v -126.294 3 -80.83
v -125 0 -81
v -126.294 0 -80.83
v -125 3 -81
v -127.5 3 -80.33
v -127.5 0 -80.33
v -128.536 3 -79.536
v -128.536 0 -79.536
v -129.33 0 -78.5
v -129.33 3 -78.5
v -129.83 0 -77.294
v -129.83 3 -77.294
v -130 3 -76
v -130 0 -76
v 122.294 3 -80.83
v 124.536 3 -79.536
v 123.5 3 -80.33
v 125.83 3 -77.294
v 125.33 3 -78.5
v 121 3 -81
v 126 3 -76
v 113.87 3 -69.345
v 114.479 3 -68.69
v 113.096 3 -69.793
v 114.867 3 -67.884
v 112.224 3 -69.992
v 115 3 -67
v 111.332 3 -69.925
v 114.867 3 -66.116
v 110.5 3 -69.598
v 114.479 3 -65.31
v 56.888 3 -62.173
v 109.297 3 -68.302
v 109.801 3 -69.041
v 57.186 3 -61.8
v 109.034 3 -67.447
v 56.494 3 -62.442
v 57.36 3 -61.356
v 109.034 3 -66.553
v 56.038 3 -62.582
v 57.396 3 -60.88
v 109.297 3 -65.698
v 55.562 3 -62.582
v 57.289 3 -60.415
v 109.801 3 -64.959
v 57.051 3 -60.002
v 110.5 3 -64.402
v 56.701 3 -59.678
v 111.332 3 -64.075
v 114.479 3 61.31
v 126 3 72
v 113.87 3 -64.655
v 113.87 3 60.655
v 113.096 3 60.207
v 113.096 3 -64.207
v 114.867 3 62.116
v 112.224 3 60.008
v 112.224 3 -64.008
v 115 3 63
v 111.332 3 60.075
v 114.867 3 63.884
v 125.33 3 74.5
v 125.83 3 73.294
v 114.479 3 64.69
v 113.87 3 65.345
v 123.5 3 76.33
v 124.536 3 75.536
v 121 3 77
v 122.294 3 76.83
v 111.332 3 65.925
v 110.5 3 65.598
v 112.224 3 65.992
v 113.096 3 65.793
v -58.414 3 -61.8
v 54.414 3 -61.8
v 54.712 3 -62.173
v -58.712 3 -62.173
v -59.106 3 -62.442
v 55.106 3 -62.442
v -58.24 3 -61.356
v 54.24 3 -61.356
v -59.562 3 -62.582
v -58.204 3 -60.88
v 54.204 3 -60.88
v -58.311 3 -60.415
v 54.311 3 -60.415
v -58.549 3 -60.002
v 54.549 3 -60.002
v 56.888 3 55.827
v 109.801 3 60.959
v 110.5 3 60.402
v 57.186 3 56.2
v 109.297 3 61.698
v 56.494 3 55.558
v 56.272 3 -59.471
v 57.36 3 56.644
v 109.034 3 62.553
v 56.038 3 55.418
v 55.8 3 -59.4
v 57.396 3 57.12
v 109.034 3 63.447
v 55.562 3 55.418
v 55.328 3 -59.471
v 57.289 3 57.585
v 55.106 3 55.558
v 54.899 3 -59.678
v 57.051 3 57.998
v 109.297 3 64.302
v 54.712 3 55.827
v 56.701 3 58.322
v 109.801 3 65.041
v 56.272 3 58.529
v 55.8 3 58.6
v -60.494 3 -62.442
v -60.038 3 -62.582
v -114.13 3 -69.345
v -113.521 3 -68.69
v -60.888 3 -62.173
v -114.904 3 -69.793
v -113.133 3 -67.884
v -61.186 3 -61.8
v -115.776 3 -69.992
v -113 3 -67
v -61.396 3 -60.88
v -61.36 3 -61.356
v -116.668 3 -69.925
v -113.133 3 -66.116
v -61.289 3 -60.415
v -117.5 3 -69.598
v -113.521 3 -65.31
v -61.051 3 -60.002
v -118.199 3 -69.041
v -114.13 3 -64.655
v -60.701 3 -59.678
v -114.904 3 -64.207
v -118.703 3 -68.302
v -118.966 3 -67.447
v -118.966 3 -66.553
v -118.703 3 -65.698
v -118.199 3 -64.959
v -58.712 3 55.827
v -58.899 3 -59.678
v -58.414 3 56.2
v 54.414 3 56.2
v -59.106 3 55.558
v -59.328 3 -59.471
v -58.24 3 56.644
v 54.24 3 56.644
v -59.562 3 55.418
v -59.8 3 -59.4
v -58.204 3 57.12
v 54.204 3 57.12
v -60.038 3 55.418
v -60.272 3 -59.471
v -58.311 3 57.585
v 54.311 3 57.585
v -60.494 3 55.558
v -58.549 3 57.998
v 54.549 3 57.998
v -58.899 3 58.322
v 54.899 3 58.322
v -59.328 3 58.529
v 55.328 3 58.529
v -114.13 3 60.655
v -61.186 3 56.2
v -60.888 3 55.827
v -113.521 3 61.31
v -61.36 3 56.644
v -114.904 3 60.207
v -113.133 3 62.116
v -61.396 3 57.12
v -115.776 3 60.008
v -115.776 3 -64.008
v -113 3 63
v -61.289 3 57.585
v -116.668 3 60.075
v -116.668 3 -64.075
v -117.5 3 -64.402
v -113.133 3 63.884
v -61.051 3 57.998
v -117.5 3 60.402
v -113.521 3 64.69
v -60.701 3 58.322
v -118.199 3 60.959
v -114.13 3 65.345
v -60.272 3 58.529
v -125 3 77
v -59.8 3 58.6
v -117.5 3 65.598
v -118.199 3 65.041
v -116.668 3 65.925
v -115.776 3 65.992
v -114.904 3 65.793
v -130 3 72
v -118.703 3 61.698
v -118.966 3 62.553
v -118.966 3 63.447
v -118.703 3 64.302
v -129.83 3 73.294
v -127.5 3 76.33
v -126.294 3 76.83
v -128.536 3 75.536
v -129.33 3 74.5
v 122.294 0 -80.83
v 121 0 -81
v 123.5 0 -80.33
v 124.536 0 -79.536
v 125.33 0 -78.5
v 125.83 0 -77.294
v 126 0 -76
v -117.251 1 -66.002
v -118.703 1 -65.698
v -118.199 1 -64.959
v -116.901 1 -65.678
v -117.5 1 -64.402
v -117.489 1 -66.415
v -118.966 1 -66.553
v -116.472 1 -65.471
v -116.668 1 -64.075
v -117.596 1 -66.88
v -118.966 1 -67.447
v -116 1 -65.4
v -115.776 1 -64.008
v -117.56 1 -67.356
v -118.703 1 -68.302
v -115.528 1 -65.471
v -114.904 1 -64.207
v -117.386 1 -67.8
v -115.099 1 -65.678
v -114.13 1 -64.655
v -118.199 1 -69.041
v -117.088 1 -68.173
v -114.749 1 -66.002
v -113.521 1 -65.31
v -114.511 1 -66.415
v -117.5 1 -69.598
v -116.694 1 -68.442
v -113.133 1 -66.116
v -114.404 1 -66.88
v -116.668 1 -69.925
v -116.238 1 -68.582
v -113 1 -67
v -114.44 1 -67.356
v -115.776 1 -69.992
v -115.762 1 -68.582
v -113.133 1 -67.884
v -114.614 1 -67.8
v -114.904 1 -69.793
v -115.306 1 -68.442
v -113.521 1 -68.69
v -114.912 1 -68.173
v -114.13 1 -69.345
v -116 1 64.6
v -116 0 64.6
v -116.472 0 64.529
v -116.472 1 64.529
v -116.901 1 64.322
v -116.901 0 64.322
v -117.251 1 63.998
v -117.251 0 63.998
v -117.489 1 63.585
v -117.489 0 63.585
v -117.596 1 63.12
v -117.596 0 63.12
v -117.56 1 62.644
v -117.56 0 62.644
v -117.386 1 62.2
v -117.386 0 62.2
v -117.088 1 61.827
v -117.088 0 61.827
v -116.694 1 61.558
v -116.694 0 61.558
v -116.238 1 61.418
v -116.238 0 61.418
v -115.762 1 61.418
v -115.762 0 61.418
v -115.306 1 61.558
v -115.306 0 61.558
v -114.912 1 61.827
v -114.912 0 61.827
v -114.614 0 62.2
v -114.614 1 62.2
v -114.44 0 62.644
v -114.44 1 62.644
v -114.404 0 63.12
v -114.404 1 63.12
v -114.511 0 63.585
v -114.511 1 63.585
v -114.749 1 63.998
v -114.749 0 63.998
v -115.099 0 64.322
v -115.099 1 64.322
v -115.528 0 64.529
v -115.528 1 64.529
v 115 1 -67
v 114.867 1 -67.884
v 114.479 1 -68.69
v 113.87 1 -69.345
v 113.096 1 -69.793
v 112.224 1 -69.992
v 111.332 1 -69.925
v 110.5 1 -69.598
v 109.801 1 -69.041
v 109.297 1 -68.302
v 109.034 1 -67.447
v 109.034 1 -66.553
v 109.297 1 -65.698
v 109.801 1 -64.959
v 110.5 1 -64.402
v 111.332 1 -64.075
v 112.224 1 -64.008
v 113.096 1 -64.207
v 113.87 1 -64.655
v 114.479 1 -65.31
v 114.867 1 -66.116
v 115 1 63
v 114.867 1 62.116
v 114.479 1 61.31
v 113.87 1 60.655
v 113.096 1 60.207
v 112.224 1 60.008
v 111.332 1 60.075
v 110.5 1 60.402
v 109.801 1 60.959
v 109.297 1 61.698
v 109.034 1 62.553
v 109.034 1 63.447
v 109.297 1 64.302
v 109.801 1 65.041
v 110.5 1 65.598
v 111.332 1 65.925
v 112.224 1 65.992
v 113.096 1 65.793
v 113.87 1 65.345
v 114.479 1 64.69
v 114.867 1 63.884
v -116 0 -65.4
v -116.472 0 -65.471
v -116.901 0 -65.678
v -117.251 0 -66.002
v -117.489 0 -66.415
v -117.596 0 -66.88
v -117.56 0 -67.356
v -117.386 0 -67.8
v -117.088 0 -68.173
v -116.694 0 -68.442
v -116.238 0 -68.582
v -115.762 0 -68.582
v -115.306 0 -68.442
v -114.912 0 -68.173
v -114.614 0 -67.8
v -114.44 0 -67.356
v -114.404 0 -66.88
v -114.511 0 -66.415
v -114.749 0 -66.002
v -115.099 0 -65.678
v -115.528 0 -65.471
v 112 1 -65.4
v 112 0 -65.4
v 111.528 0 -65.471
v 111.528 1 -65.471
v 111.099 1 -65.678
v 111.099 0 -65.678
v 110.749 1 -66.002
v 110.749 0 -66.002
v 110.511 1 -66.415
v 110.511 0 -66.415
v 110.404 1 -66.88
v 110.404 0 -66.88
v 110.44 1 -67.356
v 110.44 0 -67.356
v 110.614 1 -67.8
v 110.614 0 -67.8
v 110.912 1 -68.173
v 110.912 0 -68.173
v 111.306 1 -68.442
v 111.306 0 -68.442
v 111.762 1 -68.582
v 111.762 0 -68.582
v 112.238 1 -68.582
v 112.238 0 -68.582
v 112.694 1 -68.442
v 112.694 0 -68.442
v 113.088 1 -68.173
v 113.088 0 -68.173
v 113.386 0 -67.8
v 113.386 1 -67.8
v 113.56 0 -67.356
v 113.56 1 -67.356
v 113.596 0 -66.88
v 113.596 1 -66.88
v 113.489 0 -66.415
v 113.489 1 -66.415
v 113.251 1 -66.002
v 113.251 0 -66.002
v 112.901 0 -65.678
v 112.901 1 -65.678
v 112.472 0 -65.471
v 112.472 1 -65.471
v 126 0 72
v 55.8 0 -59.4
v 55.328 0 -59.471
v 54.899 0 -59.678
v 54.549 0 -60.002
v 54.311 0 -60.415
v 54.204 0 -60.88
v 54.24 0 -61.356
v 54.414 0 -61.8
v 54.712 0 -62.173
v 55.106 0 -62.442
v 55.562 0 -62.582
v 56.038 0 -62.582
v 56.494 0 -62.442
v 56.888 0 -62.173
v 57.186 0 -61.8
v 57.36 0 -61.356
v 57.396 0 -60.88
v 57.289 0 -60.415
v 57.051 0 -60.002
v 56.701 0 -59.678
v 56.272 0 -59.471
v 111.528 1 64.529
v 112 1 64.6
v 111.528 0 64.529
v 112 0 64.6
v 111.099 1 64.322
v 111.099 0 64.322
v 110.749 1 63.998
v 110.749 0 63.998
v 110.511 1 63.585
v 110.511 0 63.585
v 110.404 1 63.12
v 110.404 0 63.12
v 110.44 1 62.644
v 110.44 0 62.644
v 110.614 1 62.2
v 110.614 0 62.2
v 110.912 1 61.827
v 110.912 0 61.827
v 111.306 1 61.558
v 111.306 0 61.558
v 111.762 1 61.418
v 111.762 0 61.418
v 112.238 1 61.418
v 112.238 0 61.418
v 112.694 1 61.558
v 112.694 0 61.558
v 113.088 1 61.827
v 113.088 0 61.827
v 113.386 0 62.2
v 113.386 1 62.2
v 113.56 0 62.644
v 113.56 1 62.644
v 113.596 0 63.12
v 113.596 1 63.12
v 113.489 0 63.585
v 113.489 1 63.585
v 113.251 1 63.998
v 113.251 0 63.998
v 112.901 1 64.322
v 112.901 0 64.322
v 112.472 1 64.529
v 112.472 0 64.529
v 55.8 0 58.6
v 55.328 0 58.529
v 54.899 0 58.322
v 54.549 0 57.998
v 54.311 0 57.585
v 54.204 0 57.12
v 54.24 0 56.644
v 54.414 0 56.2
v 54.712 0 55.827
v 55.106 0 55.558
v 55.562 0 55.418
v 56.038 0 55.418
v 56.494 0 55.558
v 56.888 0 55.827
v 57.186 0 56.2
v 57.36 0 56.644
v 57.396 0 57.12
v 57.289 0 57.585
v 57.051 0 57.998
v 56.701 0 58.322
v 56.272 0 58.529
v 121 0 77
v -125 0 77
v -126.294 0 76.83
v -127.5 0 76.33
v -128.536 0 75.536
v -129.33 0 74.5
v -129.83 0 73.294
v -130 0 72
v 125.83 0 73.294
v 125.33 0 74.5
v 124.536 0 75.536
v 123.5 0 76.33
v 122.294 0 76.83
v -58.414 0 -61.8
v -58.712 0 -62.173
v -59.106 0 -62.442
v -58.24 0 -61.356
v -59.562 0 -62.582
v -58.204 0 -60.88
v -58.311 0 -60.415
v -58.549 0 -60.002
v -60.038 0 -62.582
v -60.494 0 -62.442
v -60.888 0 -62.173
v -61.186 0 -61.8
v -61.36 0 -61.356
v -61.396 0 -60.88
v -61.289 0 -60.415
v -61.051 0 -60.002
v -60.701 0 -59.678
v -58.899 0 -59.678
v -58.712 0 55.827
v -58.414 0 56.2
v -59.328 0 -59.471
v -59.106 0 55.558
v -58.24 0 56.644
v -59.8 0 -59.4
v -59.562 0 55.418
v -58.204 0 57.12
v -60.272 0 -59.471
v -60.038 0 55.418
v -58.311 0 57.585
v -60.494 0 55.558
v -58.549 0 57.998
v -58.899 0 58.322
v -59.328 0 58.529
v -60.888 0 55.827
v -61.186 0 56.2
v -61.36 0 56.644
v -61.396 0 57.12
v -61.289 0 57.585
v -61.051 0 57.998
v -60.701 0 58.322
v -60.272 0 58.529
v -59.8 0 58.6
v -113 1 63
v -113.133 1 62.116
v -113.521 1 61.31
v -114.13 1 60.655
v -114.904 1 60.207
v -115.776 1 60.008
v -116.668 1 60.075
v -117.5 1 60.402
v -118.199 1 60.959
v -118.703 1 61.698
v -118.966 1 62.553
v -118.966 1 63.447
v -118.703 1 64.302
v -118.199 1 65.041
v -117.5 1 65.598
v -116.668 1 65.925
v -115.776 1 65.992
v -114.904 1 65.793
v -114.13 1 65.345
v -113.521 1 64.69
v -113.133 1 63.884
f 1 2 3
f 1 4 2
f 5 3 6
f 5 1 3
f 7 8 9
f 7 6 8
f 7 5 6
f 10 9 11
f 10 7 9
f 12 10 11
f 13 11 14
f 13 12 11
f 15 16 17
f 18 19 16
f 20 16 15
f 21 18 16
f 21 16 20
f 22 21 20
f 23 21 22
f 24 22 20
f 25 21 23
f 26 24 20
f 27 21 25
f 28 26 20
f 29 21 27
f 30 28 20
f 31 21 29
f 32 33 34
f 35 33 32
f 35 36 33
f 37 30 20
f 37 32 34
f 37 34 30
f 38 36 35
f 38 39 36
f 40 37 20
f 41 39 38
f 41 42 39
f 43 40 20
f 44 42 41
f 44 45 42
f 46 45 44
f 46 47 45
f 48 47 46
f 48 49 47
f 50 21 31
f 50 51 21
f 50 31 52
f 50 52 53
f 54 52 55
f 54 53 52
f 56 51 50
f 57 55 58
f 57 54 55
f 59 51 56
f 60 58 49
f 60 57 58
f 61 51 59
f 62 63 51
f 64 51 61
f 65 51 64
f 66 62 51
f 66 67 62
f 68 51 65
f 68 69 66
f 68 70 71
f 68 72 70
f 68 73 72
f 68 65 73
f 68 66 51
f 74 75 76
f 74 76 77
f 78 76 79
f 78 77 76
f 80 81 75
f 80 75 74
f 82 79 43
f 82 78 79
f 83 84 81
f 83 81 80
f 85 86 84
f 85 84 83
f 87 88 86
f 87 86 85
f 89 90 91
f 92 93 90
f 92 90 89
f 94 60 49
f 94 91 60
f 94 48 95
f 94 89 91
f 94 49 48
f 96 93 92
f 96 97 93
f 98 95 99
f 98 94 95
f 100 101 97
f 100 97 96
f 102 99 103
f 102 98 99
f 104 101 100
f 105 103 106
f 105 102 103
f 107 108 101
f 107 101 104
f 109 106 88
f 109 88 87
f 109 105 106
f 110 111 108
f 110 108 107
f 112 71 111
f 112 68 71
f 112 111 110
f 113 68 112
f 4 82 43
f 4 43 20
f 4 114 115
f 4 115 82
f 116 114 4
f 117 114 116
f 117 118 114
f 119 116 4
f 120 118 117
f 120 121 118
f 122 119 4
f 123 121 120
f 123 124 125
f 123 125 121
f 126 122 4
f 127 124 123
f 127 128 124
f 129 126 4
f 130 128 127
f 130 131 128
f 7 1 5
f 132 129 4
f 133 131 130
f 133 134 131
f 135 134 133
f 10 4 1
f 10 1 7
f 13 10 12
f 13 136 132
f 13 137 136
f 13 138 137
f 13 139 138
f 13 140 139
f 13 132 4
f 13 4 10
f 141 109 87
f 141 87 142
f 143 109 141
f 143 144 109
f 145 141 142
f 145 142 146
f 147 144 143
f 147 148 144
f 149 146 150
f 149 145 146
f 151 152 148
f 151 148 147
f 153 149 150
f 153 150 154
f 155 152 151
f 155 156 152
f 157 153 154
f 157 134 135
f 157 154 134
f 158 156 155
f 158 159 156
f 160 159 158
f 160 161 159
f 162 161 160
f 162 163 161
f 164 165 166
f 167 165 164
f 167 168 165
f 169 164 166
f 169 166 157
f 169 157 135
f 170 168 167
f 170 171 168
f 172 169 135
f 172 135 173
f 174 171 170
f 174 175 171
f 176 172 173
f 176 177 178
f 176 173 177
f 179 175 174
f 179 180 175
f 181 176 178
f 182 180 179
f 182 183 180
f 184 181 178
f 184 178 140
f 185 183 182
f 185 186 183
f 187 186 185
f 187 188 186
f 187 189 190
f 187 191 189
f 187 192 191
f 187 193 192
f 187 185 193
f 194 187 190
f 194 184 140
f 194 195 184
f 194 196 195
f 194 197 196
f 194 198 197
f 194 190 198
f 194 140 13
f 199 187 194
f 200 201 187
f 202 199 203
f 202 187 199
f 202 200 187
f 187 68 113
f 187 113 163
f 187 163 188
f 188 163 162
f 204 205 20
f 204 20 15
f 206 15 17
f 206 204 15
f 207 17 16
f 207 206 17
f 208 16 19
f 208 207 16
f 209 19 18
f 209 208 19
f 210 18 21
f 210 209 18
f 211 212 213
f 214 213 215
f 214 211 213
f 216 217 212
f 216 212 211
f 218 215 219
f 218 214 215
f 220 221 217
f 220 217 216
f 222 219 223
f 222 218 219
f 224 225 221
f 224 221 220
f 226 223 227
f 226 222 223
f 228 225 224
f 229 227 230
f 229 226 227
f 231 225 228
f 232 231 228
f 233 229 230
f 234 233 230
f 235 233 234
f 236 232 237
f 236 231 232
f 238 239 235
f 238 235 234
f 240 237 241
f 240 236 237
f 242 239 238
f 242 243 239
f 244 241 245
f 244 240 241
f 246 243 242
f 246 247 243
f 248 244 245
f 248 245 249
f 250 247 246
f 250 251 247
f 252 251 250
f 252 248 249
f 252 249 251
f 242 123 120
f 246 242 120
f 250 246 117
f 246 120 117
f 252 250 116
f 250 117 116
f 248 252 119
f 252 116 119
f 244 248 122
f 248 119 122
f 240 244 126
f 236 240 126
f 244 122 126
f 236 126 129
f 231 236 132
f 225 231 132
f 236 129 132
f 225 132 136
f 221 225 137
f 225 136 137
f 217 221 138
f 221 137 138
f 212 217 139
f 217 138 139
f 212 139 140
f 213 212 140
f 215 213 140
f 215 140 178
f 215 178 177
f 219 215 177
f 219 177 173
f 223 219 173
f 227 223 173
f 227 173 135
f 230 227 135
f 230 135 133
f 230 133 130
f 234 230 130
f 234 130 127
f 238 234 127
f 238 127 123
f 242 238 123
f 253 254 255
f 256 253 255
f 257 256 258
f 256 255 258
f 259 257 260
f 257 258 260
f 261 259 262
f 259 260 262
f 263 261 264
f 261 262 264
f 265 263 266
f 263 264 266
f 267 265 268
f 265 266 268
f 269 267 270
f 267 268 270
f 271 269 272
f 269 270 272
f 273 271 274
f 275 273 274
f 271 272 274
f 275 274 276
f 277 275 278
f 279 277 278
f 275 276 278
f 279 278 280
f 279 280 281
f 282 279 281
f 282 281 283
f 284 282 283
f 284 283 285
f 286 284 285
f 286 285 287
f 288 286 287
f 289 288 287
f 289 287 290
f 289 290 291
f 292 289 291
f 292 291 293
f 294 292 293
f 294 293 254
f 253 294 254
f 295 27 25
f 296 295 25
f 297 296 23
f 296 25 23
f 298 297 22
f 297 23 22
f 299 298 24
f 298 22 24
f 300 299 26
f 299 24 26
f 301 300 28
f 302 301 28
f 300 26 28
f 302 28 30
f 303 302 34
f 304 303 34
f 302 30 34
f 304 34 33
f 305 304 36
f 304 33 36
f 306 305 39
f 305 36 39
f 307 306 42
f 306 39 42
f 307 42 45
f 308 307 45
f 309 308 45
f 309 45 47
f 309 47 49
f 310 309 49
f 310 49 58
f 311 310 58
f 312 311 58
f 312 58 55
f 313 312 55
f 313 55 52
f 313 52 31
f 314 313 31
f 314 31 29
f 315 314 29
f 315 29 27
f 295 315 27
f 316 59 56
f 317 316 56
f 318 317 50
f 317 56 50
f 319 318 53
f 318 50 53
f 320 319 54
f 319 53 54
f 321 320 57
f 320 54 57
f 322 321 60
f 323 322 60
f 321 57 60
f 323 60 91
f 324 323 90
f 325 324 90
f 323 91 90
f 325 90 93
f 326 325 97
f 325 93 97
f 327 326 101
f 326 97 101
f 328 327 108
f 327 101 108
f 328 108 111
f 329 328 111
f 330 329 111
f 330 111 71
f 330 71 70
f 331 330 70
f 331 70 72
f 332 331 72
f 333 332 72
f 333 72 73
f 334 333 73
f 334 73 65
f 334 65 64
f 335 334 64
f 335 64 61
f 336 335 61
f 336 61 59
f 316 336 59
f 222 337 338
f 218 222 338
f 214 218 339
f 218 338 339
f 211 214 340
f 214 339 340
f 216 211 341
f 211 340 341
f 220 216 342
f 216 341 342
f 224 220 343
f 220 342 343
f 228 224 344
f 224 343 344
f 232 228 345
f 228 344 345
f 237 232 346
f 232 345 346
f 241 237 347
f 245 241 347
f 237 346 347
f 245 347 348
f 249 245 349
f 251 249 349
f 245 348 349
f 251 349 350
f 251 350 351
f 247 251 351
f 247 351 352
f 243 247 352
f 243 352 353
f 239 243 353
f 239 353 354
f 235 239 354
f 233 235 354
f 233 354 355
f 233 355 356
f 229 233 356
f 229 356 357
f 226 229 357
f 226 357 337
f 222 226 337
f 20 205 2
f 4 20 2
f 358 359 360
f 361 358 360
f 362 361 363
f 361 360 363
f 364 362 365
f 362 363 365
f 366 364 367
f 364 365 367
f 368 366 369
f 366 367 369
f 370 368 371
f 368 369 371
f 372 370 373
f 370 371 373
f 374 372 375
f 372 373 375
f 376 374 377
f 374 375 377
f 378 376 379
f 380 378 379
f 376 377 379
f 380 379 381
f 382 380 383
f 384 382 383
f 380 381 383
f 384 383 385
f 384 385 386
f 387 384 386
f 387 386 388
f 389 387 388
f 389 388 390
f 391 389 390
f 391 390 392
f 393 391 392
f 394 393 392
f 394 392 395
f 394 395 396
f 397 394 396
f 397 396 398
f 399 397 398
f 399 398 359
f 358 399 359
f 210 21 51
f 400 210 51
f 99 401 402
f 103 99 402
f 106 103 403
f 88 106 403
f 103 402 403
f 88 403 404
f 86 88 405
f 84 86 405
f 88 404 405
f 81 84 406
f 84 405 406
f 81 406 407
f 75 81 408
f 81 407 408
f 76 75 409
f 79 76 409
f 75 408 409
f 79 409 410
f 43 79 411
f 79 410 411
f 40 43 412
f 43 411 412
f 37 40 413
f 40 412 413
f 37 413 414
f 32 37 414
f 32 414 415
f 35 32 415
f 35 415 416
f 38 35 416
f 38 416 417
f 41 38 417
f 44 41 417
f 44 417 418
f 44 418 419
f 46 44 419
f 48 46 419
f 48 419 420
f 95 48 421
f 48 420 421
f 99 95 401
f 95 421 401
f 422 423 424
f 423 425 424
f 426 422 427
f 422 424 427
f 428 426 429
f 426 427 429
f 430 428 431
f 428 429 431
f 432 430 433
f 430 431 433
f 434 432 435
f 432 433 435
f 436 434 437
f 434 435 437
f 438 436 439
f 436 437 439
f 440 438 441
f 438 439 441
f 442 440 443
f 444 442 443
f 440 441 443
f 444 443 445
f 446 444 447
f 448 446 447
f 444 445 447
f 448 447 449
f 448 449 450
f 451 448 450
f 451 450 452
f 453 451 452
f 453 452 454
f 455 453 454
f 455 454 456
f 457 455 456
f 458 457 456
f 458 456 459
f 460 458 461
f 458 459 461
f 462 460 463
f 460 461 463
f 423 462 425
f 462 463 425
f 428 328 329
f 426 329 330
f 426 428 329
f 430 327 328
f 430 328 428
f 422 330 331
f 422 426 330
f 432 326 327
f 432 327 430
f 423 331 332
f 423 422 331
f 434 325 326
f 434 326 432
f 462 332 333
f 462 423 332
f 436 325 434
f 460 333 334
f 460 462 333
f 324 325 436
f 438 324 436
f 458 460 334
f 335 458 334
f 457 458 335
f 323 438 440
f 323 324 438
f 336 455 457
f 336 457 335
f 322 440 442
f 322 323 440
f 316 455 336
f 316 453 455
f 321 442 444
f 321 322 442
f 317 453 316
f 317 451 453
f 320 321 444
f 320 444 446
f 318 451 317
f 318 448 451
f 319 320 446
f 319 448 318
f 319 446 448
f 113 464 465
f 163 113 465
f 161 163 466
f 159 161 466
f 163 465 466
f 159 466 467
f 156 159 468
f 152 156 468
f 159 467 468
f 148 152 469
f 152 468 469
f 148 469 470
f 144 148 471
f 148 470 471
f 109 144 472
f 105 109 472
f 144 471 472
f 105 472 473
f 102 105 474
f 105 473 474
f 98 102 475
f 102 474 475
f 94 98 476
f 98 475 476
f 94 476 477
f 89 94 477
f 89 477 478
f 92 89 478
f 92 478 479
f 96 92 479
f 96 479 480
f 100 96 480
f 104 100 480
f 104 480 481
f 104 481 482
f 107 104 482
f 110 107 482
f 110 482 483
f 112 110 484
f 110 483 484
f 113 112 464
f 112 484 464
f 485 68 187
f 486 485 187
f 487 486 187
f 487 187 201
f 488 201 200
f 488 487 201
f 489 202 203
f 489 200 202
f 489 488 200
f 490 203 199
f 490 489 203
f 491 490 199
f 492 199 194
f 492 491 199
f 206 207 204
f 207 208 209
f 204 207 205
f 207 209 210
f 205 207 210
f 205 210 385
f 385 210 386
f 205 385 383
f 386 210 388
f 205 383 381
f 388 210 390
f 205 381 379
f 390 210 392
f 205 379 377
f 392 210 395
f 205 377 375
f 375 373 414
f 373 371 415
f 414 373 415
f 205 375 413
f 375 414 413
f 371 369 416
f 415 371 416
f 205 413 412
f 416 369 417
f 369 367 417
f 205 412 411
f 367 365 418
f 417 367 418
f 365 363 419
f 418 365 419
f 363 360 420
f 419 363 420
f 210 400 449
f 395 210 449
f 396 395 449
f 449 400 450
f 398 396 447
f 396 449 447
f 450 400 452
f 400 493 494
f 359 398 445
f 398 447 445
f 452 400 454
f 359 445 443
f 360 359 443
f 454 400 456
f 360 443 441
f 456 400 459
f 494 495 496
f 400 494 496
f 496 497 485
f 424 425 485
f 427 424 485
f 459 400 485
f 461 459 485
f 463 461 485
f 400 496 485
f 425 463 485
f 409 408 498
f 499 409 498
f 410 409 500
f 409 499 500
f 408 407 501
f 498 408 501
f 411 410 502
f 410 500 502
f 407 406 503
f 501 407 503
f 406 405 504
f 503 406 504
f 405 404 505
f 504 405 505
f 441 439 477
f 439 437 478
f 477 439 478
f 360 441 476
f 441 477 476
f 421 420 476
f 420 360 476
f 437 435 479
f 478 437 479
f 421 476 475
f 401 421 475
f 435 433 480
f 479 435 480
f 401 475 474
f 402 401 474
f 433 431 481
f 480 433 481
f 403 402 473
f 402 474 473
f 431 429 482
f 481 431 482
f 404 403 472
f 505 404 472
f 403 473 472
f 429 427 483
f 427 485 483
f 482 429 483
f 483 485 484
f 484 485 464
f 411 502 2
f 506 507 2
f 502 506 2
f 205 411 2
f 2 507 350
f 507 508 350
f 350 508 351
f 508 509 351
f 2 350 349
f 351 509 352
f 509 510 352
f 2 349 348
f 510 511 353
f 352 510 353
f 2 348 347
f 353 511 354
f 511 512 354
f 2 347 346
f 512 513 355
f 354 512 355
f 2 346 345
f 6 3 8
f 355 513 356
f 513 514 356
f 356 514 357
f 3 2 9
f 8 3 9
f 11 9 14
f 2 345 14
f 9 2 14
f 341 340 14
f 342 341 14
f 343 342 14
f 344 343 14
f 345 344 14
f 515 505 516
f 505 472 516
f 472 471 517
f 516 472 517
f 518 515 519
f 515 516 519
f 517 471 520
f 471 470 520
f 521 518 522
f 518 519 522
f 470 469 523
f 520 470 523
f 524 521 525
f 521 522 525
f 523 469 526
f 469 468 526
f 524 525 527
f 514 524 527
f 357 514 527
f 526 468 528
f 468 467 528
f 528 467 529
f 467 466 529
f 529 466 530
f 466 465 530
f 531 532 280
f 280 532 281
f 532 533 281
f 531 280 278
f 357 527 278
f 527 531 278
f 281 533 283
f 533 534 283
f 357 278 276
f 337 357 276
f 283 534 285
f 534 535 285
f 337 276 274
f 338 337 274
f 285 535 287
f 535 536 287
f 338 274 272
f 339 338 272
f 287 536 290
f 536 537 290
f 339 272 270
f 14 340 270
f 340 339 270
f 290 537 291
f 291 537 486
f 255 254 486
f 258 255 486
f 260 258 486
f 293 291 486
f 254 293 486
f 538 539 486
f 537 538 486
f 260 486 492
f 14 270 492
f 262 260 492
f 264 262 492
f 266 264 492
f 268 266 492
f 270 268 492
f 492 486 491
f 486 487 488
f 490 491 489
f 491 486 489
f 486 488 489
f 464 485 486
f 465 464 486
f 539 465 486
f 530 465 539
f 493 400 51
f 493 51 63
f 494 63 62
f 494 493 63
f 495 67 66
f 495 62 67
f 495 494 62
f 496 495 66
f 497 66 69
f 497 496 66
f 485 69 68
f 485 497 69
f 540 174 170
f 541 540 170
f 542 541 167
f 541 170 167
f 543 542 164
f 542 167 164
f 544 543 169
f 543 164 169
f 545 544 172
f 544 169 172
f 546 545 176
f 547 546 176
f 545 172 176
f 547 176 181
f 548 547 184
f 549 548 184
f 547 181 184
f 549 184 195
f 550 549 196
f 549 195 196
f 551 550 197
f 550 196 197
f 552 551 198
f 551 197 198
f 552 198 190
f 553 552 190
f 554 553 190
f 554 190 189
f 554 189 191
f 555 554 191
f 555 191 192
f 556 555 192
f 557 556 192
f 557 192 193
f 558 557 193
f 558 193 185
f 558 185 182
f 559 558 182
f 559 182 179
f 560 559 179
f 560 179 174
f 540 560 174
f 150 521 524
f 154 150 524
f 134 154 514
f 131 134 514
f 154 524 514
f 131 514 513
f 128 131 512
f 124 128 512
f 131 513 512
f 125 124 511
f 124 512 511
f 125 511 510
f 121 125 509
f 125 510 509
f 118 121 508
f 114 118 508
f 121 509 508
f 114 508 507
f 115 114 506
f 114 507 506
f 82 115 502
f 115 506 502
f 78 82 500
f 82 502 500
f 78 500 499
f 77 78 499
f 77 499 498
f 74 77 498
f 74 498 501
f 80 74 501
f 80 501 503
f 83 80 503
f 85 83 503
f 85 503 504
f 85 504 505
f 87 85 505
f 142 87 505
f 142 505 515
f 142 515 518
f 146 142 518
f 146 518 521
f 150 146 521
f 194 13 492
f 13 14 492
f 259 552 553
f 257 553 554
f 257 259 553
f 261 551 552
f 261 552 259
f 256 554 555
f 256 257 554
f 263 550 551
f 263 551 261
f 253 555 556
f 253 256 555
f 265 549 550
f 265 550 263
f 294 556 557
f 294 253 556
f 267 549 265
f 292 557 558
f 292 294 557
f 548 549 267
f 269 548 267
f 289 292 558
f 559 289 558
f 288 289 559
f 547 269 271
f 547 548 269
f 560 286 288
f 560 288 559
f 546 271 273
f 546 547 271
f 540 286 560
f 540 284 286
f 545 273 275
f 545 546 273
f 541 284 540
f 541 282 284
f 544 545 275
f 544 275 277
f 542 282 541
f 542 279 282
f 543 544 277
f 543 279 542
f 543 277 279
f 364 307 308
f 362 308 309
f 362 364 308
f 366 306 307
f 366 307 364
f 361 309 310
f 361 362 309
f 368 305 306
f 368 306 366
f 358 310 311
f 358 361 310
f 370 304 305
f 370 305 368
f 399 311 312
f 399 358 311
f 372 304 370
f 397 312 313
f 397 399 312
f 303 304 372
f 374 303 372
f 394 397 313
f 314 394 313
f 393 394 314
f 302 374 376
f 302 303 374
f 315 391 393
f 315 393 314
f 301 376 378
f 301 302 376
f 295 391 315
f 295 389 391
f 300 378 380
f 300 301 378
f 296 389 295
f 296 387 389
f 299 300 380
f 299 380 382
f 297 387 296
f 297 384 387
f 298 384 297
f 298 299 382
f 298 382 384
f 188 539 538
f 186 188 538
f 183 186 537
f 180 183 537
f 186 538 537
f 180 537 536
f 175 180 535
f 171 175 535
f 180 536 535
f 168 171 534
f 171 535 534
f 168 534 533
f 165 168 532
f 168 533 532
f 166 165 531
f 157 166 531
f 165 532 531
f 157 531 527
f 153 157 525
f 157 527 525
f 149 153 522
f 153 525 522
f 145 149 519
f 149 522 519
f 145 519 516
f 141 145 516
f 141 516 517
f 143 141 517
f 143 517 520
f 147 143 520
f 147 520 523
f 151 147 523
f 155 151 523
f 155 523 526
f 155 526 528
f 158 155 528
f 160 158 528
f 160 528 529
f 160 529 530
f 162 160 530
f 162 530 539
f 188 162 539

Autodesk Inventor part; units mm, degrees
ref_plane "YZ Plane" through (0, 0, 0) normal (1, 0, 0) x (0, 1, 0)
ref_plane "XZ Plane" through (0, 0, 0) normal (0, 1, 0) x (-1, 0, 0)
ref_plane "XY Plane" through (0, 0, 0) normal (0, 0, 1) x (1, 0, 0)
sketch "スケッチ1" plane through (0, 0, 0) normal (0, 1, 0) x (-1, 0, 0)
  line L0 (130, 81) -> (-130, 81)
  line L1 (-130, 81) -> (-130, -81)
  line L2 (-130, -81) -> (130, -81)
  line L3 (130, -81) -> (130, 81)
  line L4 (130, 81) -> (-130, -81) construction
  line L5 (-130, 81) -> (130, -81) construction
  point P0 (0, 0)
  dimension "d0" = 260
  dimension "d1" = 162
extrude "押し出し1" add sketch "スケッチ1" along normal blind 3
sketch "スケッチ7" plane through (0, 3, 0) normal (0, 1, 0) x (1, 0, 0)
  line L0 (-130, 81) -> (-130, -81) projected
  line L1 (130, -81) -> (130, 81) projected
  line L2 (130, 81) -> (-130, 81) projected
  point P0 (0, 0)
  point P1 (-116, 67)
  point P2 (112, 67)
  point P3 (112, -63)
  point P4 (-116, -63)
  dimension "d23" = 14
  dimension "d25" = 130
  dimension "d26" = 130
  dimension "d27" = 14
  dimension "d29" = 14
  dimension "d38" = 228
  dimension "d39" = 228
  dimension "d40" = 14
hole "穴1" at (-116, 3, -67) at (112, 3, -67) at (112, 3, 63) at (-116, 3, 63) direction (0, -1, 0) diameter 3.2 depth 8
sketch "スケッチ8" plane through (0, 3, 0) normal (0, 1, 0) x (1, 0, 0)
  line L0 (130, 81) -> (-130, 81) projected
  line L1 (-130, 81) -> (126, 81)
  line L2 (126, 81) -> (126, -77)
  line L3 (126, -77) -> (-130, -77)
  line L4 (-130, -77) -> (-130, 81)
  circle A0 centre (-116, 67) radius 1.6 projected
  circle A1 centre (112, 67) radius 1.6 projected
  circle A2 centre (-116, -63) radius 1.6 projected
  circle A3 centre (-116, -63) radius 1.6 projected
  circle A4 centre (112, -63) radius 1.6 projected
  circle A5 centre (112, 67) radius 1.6 projected
  circle A6 centre (-116, 67) radius 1.6 projected
  line L5 (130, -81) -> (130, 81) projected
  line L6 (130, 81) -> (-130, 81) projected
  line L7 (-130, 81) -> (-130, -81) projected
  line L8 (-130, -81) -> (130, -81) projected
  point P0 (0, 0)
  dimension "d41" = 14
  dimension "d42" = 14
  dimension "d43" = 14
extrude "押し出し4" cut sketch "スケッチ8" against normal blind 10 contours L5 L8 L7 L3 L2 L0
fillet "フィレット1" radius 5 4 edges at (-130, 1.5, -81) (-130, 1.5, 77) (126, 1.5, -81) (126, 1.5, 77)
sketch "スケッチ9" plane through (0, 3, 0) normal (0, 1, 0) x (1, 0, 0)
  arc A0 (121, -77) -> (126, -72) centre (121, -72) ccw projected
  line L0 (126, -72) -> (126, 76) projected
  arc A1 (126, 76) -> (121, 81) centre (121, 76) ccw projected
  line L1 (121, 81) -> (-125, 81) projected
  arc A2 (-125, 81) -> (-130, 76) centre (-125, 76) ccw projected
  line L2 (-130, 76) -> (-130, -72) projected
  arc A3 (-130, -72) -> (-125, -77) centre (-125, -72) ccw projected
  line L3 (-125, -77) -> (121, -77) projected
  circle A4 centre (-116, 67) radius 1.6 projected
  circle A5 centre (112, 67) radius 1.6 projected
  circle A6 centre (112, -63) radius 1.6 projected
  circle A7 centre (-116, -63) radius 1.6 projected
  circle A8 centre (-116, 67) radius 3
  circle A9 centre (-116, -63) radius 3
  circle A10 centre (112, -63) radius 3
  circle A11 centre (112, 67) radius 3
  point P0 (0, 0)
  dimension "d47" = 6
  dimension "d48" = 6
  dimension "d49" = 6
  dimension "d50" = 6
extrude "押し出し5" cut sketch "スケッチ9" against normal blind 2 contours A4 | A5 | A6 | A7 | A8 | A9 | A10 | A11
sketch "スケッチ10" plane through (0, 3, 0) normal (0, 1, 0) x (1, 0, 0)
  line L0 (121, 81) -> (-125, 81) projected
  line L1 (121, -77) -> (-125, -77) projected
  line L2 (-90, 81) -> (-69.8, 81)
  line L3 (-69.8, 81) -> (-69.8, -77)
  line L4 (-69.8, -77) -> (-90, -77)
  line L5 (-90, -77) -> (-90, 81)
  line L6 (86, 81) -> (65.8, 81)
  line L7 (65.8, 81) -> (65.8, -77)
  line L8 (65.8, -77) -> (86, -77)
  line L9 (86, -77) -> (86, 81)
  line L10 (-69.8, 81) -> (-49.6, 81)
  line L11 (-49.6, 81) -> (-49.6, -77)
  line L12 (-49.6, -77) -> (-69.8, -77)
  line L13 (-69.8, -77) -> (-69.8, 81)
  line L14 (65.8, 81) -> (45.6, 81)
  line L15 (45.6, 81) -> (45.6, -77)
  line L16 (45.6, -77) -> (65.8, -77)
  line L17 (65.8, -77) -> (65.8, 81)
  line L18 (45.6, -77) -> (25.4, -77)
  line L19 (25.4, -77) -> (25.4, 81)
  line L20 (25.4, 81) -> (45.6, 81)
  line L21 (45.6, 81) -> (45.6, -77)
  line L22 (-49.6, 81) -> (-29.4, 81)
  line L23 (-29.4, 81) -> (-29.4, -77)
  line L24 (-29.4, -77) -> (-49.6, -77)
  line L25 (-49.6, -77) -> (-49.6, 81)
  line L26 (-130, 76) -> (-130, -72) projected
  line L27 (126, -72) -> (126, 76) projected
  line L28 (-69.7, 81) -> (-49.7, 81)
  line L29 (-49.7, 81) -> (-49.7, -77)
  line L30 (-49.7, -77) -> (-69.7, -77)
  line L31 (-69.7, -77) -> (-69.7, 81)
  line L32 (0, 0) -> (0, 23.1289)
  line L33 (-69.9, 81) -> (-87.9535, 81)
  line L34 (-87.9535, 81) -> (-87.9535, -77)
  line L35 (-87.9535, -77) -> (-69.9, -77)
  line L36 (-69.9, -77) -> (-69.9, 81)
  point P0 (-59.8, 61)
  point P1 (-59.8, -57)
  point P2 (55.8, 61)
  point P3 (55.8, -57)
  dimension "d53" = 20.2
  dimension "d54" = 20.2
  dimension "d55" = 20.2
  dimension "d56" = 20.2
  dimension "d57" = 20.2
  dimension "d58" = 20.2
  dimension "d59" = 40
  dimension "d60" = 40
  dimension "d61" = 0.1
  dimension "d62" = 0.1
  dimension "d63" = 20
  dimension "d64" = 20
  dimension "d66" = 256
  dimension "d67" = 158
  dimension "d68" = 0.2
  dimension "d69" = 20
  dimension "d70" = 118
  dimension "d71" = 70.2
  dimension "d72" = 70.2
  dimension "d80" = 70.2
  dimension "d81" = 70.2
  dimension "d14" = 30
  dimension "d15" = 30
  dimension "d16" = 30
  dimension "d17" = 30
hole "穴2" at (-59.8, 3, -61) at (-59.8, 3, 57) at (55.8, 3, -61) at (55.8, 3, 57) direction (0, -1, 0) diameter 3.2 depth 8
equation "\"d26\" = d25"
equation "\"d27\" = d23"
equation "\"d39\" = d38"
equation "\"d42\" = d41"
equation "\"d43\" = d41"
equation "\"d48\" = d47"
equation "\"d49\" = d47"
equation "\"d50\" = d47"
equation "\"d54\" = d53"
equation "\"d55\" = d53"
equation "\"d56\" = d54"
equation "\"d57\" = d56"
equation "\"d58\" = d57"
equation "\"d62\" = d61"
equation "\"d64\" = d63"
equation "\"d71\" = d72"
equation "\"d81\" = d80"
properties part number "BP_BOX-Above" material "アセタール樹脂、白"
